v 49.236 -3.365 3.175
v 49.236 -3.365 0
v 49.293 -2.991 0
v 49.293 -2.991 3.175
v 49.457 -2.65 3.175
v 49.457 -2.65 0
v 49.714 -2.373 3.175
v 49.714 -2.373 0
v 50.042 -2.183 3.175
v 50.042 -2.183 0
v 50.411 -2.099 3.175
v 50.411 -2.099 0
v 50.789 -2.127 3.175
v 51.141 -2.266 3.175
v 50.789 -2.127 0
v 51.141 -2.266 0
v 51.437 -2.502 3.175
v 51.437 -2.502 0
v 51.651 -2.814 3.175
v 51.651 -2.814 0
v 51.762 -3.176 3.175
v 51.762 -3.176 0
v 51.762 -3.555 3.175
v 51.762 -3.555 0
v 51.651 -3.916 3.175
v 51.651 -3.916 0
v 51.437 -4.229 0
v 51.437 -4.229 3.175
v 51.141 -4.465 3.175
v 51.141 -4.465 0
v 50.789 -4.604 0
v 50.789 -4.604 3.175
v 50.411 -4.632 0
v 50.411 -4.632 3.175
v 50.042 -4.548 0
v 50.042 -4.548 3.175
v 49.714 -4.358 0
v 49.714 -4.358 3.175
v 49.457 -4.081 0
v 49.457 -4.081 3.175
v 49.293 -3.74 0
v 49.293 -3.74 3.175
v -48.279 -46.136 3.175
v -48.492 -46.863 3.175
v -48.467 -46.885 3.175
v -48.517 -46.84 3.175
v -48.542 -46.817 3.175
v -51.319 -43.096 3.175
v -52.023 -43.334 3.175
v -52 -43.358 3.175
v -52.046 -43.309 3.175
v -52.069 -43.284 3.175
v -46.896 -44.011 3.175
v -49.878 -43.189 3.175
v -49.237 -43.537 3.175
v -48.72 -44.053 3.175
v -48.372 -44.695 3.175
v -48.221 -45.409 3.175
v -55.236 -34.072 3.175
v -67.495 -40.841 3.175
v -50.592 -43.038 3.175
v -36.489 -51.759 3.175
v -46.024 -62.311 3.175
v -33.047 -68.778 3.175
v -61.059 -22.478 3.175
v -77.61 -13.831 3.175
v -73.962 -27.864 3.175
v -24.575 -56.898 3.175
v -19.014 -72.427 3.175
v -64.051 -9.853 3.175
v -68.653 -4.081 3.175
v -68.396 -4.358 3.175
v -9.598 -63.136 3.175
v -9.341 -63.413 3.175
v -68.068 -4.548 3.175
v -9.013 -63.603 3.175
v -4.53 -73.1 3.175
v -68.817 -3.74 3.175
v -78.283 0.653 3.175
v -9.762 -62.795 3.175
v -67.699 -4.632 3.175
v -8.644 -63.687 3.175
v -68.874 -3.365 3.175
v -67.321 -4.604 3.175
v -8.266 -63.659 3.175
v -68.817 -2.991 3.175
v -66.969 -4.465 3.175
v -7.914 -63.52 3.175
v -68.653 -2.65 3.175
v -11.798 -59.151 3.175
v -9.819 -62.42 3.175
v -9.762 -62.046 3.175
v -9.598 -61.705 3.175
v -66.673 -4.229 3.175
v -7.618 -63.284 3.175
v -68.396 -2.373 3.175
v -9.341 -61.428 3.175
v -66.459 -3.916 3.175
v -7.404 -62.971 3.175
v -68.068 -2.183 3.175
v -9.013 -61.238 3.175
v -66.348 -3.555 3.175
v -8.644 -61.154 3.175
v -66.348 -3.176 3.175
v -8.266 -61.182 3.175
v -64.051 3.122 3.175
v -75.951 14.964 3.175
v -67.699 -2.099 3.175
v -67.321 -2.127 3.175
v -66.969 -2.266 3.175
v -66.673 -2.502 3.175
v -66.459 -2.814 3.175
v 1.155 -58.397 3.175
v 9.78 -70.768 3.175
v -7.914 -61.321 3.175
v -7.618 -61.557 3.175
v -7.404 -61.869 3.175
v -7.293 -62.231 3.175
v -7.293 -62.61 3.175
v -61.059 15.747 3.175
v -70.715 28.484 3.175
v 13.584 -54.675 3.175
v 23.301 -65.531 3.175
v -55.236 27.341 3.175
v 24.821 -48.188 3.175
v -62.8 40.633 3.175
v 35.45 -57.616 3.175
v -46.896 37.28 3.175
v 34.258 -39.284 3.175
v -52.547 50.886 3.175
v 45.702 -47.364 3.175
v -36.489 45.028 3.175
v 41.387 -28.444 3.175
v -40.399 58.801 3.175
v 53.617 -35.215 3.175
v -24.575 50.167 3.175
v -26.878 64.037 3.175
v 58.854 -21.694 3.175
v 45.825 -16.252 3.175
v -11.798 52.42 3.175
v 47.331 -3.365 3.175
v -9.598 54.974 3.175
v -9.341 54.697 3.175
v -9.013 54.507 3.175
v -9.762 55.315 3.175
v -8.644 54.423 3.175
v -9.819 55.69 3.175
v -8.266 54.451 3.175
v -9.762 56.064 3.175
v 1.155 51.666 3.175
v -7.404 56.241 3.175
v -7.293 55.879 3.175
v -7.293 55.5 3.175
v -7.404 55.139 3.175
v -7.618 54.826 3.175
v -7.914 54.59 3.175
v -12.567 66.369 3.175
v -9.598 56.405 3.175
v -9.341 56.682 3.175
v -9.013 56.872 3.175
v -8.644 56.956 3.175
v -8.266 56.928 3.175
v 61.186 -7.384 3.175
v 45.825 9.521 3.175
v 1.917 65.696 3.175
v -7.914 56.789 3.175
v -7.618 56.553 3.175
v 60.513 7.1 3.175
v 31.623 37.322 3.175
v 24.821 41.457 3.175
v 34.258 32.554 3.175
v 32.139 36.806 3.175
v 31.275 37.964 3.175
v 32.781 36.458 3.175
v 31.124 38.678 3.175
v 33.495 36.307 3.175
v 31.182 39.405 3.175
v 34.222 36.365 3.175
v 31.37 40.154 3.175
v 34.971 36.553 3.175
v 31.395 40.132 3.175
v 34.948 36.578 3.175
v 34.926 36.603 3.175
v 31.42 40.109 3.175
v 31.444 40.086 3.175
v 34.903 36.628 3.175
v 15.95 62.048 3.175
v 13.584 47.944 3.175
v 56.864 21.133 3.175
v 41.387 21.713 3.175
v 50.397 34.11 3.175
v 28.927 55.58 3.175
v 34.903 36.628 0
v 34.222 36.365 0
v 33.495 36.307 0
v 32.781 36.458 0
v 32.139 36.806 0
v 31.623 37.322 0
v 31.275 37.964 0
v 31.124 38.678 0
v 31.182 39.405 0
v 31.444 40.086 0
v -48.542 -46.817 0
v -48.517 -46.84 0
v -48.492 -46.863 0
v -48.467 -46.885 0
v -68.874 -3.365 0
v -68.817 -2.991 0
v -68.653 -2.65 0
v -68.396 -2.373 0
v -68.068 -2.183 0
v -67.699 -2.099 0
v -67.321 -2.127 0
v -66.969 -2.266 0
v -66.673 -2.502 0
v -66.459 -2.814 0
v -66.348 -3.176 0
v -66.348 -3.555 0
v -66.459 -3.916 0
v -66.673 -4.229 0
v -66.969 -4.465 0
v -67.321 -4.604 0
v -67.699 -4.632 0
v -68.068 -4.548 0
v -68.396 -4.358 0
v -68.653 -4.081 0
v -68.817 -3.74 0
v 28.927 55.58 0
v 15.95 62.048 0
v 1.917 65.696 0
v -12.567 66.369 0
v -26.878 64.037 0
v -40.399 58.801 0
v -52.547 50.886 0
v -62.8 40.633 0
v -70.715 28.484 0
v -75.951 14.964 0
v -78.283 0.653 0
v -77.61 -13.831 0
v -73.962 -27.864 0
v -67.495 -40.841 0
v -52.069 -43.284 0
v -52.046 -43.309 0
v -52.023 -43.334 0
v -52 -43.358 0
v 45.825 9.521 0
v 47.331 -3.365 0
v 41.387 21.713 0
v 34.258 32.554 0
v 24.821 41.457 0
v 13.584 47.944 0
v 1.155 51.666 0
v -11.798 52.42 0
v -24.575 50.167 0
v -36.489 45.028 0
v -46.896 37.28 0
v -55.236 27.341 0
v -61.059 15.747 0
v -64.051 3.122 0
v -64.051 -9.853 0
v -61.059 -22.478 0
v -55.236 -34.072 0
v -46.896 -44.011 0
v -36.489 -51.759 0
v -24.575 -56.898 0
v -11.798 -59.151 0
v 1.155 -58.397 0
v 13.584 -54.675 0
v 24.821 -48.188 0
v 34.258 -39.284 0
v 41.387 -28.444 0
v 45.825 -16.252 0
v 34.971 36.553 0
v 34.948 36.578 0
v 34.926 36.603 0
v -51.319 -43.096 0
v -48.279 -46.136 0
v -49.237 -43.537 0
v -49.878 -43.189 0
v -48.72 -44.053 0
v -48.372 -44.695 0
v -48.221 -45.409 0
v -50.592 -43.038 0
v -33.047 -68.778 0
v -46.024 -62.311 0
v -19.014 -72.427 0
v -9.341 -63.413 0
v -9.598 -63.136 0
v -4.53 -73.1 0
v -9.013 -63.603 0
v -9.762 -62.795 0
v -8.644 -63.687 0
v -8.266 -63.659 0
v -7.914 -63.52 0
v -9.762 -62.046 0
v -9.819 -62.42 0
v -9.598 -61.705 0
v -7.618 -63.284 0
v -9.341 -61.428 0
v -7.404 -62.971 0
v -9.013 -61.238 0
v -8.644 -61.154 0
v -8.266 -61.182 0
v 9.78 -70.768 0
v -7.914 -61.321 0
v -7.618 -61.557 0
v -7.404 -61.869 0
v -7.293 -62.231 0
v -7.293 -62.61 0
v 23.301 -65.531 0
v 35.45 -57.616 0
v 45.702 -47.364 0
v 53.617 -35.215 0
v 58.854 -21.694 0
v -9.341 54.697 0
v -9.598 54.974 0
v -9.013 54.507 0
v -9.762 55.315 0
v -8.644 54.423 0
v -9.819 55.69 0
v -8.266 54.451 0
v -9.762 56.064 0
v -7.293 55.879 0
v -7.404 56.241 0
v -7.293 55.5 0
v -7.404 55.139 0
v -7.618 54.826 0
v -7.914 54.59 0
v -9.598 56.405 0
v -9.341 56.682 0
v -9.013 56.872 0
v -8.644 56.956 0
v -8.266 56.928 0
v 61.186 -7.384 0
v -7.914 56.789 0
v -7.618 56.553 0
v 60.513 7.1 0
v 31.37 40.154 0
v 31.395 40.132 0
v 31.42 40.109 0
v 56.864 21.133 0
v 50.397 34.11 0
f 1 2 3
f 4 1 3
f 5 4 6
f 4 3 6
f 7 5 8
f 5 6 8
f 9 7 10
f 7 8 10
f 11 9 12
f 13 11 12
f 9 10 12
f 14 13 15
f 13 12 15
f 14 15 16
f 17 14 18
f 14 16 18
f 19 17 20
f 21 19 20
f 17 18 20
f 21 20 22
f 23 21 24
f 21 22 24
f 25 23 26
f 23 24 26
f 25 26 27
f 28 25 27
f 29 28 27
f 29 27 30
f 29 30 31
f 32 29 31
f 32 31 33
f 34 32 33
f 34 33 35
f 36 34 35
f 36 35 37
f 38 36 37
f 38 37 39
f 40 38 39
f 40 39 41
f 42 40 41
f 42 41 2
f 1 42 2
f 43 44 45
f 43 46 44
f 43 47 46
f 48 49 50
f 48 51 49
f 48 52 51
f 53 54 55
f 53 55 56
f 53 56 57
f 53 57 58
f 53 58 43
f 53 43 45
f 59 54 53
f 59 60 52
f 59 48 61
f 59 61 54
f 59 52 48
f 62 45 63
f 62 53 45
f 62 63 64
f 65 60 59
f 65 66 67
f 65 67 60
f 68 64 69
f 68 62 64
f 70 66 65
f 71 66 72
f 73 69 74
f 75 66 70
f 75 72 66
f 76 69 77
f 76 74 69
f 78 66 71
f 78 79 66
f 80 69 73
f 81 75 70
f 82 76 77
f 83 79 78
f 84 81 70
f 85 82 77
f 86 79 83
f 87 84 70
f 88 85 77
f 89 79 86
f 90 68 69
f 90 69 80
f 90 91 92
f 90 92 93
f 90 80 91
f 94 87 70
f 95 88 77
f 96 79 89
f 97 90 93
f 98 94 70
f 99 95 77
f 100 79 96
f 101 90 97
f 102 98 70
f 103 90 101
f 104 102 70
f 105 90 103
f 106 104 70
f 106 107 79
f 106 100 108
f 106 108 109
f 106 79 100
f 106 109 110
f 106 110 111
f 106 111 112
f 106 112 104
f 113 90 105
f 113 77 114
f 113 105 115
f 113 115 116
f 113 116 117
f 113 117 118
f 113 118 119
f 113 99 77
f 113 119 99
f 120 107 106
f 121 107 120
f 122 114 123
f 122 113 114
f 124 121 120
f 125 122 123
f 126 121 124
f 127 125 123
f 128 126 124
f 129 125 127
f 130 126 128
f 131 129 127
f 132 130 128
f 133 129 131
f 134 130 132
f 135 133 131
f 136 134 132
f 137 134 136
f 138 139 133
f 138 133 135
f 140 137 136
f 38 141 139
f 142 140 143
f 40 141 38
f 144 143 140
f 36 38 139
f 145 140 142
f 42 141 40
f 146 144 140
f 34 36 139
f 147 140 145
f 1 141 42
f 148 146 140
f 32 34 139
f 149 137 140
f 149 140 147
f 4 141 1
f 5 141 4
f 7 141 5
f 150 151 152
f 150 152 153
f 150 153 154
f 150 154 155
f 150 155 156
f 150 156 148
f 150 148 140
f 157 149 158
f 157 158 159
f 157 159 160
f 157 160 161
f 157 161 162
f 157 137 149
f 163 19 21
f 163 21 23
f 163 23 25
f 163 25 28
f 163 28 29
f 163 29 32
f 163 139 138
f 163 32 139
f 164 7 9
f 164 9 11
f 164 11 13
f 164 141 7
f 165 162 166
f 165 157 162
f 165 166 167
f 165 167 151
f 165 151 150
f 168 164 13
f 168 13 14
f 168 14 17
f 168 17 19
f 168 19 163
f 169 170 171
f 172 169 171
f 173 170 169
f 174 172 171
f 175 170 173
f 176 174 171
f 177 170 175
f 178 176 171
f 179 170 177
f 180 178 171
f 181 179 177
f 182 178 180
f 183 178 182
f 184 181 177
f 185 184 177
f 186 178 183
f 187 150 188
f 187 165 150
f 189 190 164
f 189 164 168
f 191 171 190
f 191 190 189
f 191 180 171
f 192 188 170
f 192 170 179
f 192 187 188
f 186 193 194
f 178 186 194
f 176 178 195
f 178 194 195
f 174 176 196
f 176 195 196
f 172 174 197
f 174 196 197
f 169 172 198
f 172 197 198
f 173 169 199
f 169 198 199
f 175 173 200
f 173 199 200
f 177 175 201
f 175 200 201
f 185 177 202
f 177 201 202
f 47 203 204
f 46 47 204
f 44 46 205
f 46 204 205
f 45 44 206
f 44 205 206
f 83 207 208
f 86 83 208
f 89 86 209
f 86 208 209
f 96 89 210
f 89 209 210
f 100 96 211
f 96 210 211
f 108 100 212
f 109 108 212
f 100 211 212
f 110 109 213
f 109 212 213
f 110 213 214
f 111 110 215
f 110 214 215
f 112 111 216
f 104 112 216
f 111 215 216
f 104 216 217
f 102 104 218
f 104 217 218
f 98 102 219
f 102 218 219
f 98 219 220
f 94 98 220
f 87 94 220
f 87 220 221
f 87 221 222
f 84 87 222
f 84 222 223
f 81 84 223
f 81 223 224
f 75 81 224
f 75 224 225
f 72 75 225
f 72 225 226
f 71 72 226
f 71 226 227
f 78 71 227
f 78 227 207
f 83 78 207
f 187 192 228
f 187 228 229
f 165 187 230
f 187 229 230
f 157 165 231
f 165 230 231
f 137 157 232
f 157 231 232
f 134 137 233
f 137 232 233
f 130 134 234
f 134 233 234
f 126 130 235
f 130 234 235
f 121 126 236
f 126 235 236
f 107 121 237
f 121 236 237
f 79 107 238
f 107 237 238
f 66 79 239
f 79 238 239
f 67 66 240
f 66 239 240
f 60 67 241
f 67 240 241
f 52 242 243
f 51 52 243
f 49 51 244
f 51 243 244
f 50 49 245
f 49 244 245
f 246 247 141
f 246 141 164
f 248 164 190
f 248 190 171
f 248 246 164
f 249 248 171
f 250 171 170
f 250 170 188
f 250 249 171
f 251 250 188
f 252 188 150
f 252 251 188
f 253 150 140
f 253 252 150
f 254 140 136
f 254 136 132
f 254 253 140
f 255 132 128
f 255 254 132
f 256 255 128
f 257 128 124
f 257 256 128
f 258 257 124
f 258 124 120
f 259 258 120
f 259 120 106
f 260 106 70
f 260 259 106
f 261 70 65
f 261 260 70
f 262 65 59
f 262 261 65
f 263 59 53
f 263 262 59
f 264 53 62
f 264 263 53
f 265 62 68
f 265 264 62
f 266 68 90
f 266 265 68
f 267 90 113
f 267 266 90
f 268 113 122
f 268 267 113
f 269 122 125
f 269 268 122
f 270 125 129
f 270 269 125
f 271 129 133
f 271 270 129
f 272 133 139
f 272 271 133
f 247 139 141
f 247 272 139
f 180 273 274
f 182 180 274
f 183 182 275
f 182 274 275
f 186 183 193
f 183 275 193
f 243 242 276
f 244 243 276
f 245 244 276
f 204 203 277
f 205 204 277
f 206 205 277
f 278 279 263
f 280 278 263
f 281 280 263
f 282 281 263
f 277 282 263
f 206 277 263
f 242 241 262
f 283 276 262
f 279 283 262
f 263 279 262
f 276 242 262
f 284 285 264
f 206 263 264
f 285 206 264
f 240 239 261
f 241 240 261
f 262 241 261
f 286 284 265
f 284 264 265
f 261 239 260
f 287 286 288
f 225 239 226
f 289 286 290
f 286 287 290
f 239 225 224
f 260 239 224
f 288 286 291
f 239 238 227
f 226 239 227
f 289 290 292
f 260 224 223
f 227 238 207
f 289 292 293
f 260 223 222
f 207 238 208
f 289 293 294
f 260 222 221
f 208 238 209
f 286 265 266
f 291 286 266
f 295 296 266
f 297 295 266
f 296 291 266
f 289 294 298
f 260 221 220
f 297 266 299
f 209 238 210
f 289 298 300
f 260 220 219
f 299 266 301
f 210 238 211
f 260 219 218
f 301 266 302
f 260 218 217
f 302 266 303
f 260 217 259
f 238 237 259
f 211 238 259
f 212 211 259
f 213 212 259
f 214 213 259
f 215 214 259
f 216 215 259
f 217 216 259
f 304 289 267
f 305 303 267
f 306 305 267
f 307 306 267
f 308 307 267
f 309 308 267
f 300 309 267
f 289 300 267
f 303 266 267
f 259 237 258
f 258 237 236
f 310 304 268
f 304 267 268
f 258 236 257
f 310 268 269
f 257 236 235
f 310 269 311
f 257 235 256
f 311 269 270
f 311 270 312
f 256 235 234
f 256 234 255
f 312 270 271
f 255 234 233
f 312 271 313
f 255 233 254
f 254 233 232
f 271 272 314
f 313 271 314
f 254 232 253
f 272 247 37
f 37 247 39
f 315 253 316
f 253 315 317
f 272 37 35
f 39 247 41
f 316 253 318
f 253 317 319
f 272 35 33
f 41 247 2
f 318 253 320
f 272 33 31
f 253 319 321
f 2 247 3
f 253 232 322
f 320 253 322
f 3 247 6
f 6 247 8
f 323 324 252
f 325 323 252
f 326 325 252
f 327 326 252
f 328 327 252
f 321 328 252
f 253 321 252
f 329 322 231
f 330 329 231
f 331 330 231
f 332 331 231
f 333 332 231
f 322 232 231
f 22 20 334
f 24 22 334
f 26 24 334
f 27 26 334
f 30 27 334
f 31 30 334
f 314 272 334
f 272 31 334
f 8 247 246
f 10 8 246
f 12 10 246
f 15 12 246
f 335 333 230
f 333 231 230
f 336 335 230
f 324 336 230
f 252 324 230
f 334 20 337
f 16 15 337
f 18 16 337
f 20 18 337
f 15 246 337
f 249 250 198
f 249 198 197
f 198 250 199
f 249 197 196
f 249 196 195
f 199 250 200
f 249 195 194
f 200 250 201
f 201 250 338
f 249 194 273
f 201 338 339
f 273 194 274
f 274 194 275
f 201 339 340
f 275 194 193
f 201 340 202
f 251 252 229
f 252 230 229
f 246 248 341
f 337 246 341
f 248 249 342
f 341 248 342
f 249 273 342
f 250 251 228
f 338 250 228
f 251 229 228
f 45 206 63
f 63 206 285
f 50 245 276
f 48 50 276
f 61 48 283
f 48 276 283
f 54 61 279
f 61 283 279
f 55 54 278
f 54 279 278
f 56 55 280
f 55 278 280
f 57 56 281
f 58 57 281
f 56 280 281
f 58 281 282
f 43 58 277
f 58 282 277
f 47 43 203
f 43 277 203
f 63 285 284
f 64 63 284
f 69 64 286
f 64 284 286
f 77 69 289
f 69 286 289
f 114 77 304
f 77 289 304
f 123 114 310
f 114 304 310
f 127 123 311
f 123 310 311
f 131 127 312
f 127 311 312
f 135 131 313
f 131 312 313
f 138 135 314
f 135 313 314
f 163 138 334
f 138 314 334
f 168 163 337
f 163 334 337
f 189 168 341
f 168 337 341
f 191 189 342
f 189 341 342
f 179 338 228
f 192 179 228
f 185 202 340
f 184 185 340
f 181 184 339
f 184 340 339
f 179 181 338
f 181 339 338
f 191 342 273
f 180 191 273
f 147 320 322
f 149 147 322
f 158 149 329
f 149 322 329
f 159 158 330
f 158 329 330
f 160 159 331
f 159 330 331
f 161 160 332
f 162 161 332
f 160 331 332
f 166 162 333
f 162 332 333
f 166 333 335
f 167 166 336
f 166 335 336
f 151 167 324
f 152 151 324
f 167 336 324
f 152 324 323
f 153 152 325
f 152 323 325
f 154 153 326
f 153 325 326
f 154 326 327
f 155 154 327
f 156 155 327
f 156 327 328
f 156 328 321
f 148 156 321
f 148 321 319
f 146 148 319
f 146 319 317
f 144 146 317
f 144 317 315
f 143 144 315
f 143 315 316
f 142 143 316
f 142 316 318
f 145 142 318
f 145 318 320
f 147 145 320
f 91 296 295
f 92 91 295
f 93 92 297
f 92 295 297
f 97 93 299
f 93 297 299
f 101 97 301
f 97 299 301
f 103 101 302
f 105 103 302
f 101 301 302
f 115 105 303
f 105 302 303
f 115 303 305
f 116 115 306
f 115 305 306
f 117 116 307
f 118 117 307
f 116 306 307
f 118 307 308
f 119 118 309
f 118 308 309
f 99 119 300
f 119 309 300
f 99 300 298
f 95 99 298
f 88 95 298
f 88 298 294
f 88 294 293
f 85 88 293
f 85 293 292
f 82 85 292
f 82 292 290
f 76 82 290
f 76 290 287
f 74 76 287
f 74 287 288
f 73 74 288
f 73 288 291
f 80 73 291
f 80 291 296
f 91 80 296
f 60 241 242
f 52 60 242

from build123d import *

# Parameters (mm, degrees)
SKETCH1_R           = 69.85
SKETCH1_R_2         = 55.88
BOSS_EXTRUDE1_DEPTH = 3.175
SKETCH4_R           = 1.27
CUT_EXTRUDE2_DEPTH  = 108.317012813


with BuildPart() as part:
    # Sketch1 → Boss-Extrude1 (new body)
    with BuildSketch(Plane.XY):
        with Locations((-8.548720341, -3.365444156)):
            Circle(SKETCH1_R)
        with Locations((-8.548720341, -3.365444156)):
            Circle(SKETCH1_R_2, mode=Mode.SUBTRACT)
    extrude(amount=BOSS_EXTRUDE1_DEPTH)

    # Sketch4 → Cut-Extrude2 (cut, through all)
    with BuildSketch(Plane(origin=(0, 0, 0), x_dir=(-1, 0, 0), z_dir=(0, 0, -1))):
        with BuildLine():
            ThreePointArc((-28.926835269, 55.58033798), (-40.842688325, 46.02596451), (-50.397061795, 34.110111454))
            Line((-50.397061795, 34.110111454), (-34.971216033, 36.553325402))
            ThreePointArc((-34.971216033, 36.553325402), (-34.937133041, 36.590451286), (-34.903018379, 36.62754807))
            ThreePointArc((-34.903018379, 36.62754807), (-31.862432204, 37.045708389), (-31.444271885, 40.086294564))
            ThreePointArc((-31.444271885, 40.086294564), (-31.407175101, 40.120409226), (-31.370049217, 40.154492217))
            Line((-31.370049217, 40.154492217), (-28.926835269, 55.58033798))
        make_face()
        with BuildLine():
            ThreePointArc((46.024275952, -62.311226293), (57.940129007, -52.756852822), (67.494502478, -40.840999767))
            Line((67.494502478, -40.840999767), (52.068656715, -43.284213714))
            ThreePointArc((52.068656715, -43.284213714), (52.034573724, -43.321339599), (52.000459061, -43.358436383))
            ThreePointArc((52.000459061, -43.358436383), (48.959872886, -43.776596701), (48.541712568, -46.817182876))
            ThreePointArc((48.541712568, -46.817182876), (48.504615784, -46.851297539), (48.467489899, -46.88538053))
            Line((48.467489899, -46.88538053), (46.024275952, -62.311226293))
        make_face()
        with Locations((-50.506279659, -3.365444156)):
            Circle(SKETCH4_R)
        with Locations((8.548720341, -62.420444156)):
            Circle(SKETCH4_R)
        with Locations((8.548720341, 55.689555844)):
            Circle(SKETCH4_R)
        with Locations((67.603720341, -3.365444156)):
            Circle(SKETCH4_R)
    extrude(amount=-CUT_EXTRUDE2_DEPTH, mode=Mode.SUBTRACT)


solid = part.part
